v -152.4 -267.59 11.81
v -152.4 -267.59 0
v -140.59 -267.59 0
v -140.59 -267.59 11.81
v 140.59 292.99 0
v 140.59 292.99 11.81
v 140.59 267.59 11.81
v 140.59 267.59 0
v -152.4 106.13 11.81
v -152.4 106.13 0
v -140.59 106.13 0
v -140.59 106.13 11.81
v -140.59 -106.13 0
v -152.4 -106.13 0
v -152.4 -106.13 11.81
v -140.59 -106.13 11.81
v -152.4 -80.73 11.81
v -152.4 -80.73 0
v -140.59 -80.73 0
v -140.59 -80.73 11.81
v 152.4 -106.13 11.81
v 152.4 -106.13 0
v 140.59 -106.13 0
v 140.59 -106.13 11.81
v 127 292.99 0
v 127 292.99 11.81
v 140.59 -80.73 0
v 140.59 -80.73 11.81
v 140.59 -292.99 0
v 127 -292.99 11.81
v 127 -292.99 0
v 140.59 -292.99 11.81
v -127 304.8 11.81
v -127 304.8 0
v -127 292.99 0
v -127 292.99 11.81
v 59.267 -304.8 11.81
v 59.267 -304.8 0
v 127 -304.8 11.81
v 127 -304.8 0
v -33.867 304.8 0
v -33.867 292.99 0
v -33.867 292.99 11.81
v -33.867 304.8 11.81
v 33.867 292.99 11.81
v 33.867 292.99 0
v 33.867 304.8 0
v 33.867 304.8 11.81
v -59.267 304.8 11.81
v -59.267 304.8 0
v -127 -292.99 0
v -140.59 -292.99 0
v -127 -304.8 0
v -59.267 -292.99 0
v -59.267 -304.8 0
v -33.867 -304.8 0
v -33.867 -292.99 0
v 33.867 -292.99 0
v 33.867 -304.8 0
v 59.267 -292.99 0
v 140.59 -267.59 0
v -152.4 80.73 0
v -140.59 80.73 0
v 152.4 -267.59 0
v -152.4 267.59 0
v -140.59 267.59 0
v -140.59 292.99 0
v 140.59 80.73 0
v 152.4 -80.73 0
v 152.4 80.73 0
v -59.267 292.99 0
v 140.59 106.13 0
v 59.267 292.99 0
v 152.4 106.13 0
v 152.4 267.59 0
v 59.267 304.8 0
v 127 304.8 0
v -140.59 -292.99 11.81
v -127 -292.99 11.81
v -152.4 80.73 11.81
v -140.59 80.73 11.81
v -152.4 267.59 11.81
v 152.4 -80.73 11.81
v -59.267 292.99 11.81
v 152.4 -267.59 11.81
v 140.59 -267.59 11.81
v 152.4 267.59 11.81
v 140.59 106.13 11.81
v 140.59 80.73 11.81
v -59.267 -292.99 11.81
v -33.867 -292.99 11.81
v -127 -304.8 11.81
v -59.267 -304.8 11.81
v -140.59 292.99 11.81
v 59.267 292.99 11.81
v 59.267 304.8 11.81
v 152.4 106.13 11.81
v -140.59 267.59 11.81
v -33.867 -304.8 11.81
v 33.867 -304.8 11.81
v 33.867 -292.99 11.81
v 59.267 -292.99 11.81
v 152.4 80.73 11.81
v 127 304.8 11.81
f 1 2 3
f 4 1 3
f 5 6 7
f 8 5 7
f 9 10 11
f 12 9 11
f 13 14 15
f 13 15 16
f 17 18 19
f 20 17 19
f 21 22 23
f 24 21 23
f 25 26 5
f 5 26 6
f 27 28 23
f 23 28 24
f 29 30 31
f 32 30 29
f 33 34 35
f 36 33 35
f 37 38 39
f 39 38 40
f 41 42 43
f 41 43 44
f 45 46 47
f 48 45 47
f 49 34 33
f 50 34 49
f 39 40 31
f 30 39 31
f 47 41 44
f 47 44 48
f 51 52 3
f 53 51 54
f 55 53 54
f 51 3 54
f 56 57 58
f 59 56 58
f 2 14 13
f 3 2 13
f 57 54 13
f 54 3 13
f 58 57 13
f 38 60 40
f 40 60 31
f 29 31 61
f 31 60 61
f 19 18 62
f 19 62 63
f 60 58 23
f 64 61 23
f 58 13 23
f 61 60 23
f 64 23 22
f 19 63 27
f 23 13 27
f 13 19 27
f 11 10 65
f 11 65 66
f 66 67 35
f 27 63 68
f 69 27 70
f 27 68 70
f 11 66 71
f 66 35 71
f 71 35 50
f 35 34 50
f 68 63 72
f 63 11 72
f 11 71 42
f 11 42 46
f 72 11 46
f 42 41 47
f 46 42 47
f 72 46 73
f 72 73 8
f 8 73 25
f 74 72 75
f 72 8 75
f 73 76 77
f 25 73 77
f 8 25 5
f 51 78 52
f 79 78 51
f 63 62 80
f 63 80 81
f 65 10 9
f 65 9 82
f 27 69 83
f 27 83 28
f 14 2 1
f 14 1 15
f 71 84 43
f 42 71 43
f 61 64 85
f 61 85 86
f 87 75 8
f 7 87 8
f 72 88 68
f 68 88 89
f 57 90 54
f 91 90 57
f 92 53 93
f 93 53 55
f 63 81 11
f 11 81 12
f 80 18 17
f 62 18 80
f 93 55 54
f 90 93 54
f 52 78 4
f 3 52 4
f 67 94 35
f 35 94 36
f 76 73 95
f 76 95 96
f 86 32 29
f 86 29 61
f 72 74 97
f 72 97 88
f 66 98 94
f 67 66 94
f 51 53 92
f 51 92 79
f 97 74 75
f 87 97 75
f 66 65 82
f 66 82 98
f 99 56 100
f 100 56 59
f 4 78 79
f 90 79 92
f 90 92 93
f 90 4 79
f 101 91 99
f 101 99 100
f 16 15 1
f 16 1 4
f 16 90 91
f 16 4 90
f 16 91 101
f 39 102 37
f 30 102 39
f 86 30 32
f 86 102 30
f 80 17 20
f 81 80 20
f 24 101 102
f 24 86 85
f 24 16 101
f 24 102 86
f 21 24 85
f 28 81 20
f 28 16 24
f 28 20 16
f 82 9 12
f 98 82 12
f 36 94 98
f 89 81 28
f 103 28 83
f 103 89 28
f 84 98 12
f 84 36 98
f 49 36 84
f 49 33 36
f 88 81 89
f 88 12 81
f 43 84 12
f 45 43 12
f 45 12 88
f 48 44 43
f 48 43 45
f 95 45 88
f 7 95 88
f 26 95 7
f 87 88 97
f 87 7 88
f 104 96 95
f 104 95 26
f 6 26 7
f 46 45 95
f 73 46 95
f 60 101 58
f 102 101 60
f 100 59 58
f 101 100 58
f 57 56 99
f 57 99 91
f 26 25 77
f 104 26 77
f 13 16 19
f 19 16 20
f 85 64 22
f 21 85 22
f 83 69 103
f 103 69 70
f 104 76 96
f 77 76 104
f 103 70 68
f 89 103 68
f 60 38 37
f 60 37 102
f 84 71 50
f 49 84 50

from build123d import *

# Parameters (mm, degrees)
BASE_SKETCH_W           = 304.8
BASE_SKETCH_H           = 609.6
BOSS_EXTRUDE1_DEPTH     = 11.81
JOINT_X_W               = 25.4
JOINT_X_H               = 11.81
CUT_EXTRUDE1_DEPTH      = 341.981342745
LPATTERN1_COUNT         = 4
LPATTERN1_PITCH         = 93.133333333
MIRROR1_COPY_1_SKETCH_W = 25.4
MIRROR1_COPY_1_SKETCH_H = 11.81
MIRROR1_COPY_1_DEPTH    = 341.981342745
MIRROR1_COPY_2_SKETCH_W = 25.4
MIRROR1_COPY_2_SKETCH_H = 11.81
MIRROR1_COPY_2_DEPTH    = 341.981342745
MIRROR1_COPY_3_SKETCH_W = 25.4
MIRROR1_COPY_3_SKETCH_H = 11.81
MIRROR1_COPY_3_DEPTH    = 341.981342745
JOINT_Y_W               = 11.81
JOINT_Y_H               = 25.4
CUT_EXTRUDE2_DEPTH      = 341.981342745
LPATTERN3_COUNT         = 4
LPATTERN3_PITCH         = 186.86
MIRROR4_COPY_1_SKETCH_W = 11.81
MIRROR4_COPY_1_SKETCH_H = 25.4
MIRROR4_COPY_1_DEPTH    = 341.981342745
MIRROR4_COPY_2_SKETCH_W = 11.81
MIRROR4_COPY_2_SKETCH_H = 25.4
MIRROR4_COPY_2_DEPTH    = 341.981342745
MIRROR4_COPY_3_SKETCH_W = 11.81
MIRROR4_COPY_3_SKETCH_H = 25.4
MIRROR4_COPY_3_DEPTH    = 341.981342745


with BuildPart() as part:
    # Base_Sketch → Boss-Extrude1 (new body)
    with BuildSketch(Plane.XY):
        Rectangle(BASE_SKETCH_W, BASE_SKETCH_H)
    extrude(amount=BOSS_EXTRUDE1_DEPTH)

    # Joint_X → Cut-Extrude1 (cut, through all)
    with BuildSketch(Plane.XY.offset(11.81)):
        with Locations((-139.7, -298.895)):
            Rectangle(JOINT_X_W, JOINT_X_H)
    cut_extrude1 = extrude(amount=-CUT_EXTRUDE1_DEPTH, mode=Mode.SUBTRACT)

    # LPattern1: Cut-Extrude1 ×4
    with Locations(*[(i * LPATTERN1_PITCH, 0, 0) for i in range(1, LPATTERN1_COUNT)]):
        add(cut_extrude1, mode=Mode.SUBTRACT)

    # Mirror1: Cut-Extrude1 across plane
    add(cut_extrude1.mirror(Plane.ZX), mode=Mode.SUBTRACT)

    # Mirror1 copy 1 sketch → Mirror1 copy 1 (cut, through all)
    with BuildSketch(Plane(origin=(93.133333333, 0, 11.81), x_dir=(1, 0, 0), z_dir=(0, 0, 1))):
        with Locations((-139.7, 298.895)):
            Rectangle(MIRROR1_COPY_1_SKETCH_W, MIRROR1_COPY_1_SKETCH_H)
    extrude(amount=-MIRROR1_COPY_1_DEPTH, mode=Mode.SUBTRACT)

    # Mirror1 copy 2 sketch → Mirror1 copy 2 (cut, through all)
    with BuildSketch(Plane(origin=(186.266666667, 0, 11.81), x_dir=(1, 0, 0), z_dir=(0, 0, 1))):
        with Locations((-139.7, 298.895)):
            Rectangle(MIRROR1_COPY_2_SKETCH_W, MIRROR1_COPY_2_SKETCH_H)
    extrude(amount=-MIRROR1_COPY_2_DEPTH, mode=Mode.SUBTRACT)

    # Mirror1 copy 3 sketch → Mirror1 copy 3 (cut, through all)
    with BuildSketch(Plane(origin=(279.4, 0, 11.81), x_dir=(1, 0, 0), z_dir=(0, 0, 1))):
        with Locations((-139.7, 298.895)):
            Rectangle(MIRROR1_COPY_3_SKETCH_W, MIRROR1_COPY_3_SKETCH_H)
    extrude(amount=-MIRROR1_COPY_3_DEPTH, mode=Mode.SUBTRACT)

    # Joint_Y → Cut-Extrude2 (cut, through all)
    with BuildSketch(Plane.XY.offset(11.81)):
        with Locations((-146.495, -280.29)):
            Rectangle(JOINT_Y_W, JOINT_Y_H)
    cut_extrude2 = extrude(amount=-CUT_EXTRUDE2_DEPTH, mode=Mode.SUBTRACT)

    # LPattern3: Cut-Extrude2 ×4
    with Locations(*[(0, i * LPATTERN3_PITCH, 0) for i in range(1, LPATTERN3_COUNT)]):
        add(cut_extrude2, mode=Mode.SUBTRACT)

    # Mirror4: Cut-Extrude2 across plane
    add(cut_extrude2.mirror(Plane(origin=(0, 0, 0), x_dir=(0, 0, 1), z_dir=(1, 0, 0))), mode=Mode.SUBTRACT)

    # Mirror4 copy 1 sketch → Mirror4 copy 1 (cut, through all)
    with BuildSketch(Plane(origin=(0, 186.86, 11.81), x_dir=(-1, 0, 0), z_dir=(0, 0, 1))):
        with Locations((-146.495, 280.29)):
            Rectangle(MIRROR4_COPY_1_SKETCH_W, MIRROR4_COPY_1_SKETCH_H)
    extrude(amount=-MIRROR4_COPY_1_DEPTH, mode=Mode.SUBTRACT)

    # Mirror4 copy 2 sketch → Mirror4 copy 2 (cut, through all)
    with BuildSketch(Plane(origin=(0, 373.72, 11.81), x_dir=(-1, 0, 0), z_dir=(0, 0, 1))):
        with Locations((-146.495, 280.29)):
            Rectangle(MIRROR4_COPY_2_SKETCH_W, MIRROR4_COPY_2_SKETCH_H)
    extrude(amount=-MIRROR4_COPY_2_DEPTH, mode=Mode.SUBTRACT)

    # Mirror4 copy 3 sketch → Mirror4 copy 3 (cut, through all)
    with BuildSketch(Plane(origin=(0, 560.58, 11.81), x_dir=(-1, 0, 0), z_dir=(0, 0, 1))):
        with Locations((-146.495, 280.29)):
            Rectangle(MIRROR4_COPY_3_SKETCH_W, MIRROR4_COPY_3_SKETCH_H)
    extrude(amount=-MIRROR4_COPY_3_DEPTH, mode=Mode.SUBTRACT)


solid = part.part
